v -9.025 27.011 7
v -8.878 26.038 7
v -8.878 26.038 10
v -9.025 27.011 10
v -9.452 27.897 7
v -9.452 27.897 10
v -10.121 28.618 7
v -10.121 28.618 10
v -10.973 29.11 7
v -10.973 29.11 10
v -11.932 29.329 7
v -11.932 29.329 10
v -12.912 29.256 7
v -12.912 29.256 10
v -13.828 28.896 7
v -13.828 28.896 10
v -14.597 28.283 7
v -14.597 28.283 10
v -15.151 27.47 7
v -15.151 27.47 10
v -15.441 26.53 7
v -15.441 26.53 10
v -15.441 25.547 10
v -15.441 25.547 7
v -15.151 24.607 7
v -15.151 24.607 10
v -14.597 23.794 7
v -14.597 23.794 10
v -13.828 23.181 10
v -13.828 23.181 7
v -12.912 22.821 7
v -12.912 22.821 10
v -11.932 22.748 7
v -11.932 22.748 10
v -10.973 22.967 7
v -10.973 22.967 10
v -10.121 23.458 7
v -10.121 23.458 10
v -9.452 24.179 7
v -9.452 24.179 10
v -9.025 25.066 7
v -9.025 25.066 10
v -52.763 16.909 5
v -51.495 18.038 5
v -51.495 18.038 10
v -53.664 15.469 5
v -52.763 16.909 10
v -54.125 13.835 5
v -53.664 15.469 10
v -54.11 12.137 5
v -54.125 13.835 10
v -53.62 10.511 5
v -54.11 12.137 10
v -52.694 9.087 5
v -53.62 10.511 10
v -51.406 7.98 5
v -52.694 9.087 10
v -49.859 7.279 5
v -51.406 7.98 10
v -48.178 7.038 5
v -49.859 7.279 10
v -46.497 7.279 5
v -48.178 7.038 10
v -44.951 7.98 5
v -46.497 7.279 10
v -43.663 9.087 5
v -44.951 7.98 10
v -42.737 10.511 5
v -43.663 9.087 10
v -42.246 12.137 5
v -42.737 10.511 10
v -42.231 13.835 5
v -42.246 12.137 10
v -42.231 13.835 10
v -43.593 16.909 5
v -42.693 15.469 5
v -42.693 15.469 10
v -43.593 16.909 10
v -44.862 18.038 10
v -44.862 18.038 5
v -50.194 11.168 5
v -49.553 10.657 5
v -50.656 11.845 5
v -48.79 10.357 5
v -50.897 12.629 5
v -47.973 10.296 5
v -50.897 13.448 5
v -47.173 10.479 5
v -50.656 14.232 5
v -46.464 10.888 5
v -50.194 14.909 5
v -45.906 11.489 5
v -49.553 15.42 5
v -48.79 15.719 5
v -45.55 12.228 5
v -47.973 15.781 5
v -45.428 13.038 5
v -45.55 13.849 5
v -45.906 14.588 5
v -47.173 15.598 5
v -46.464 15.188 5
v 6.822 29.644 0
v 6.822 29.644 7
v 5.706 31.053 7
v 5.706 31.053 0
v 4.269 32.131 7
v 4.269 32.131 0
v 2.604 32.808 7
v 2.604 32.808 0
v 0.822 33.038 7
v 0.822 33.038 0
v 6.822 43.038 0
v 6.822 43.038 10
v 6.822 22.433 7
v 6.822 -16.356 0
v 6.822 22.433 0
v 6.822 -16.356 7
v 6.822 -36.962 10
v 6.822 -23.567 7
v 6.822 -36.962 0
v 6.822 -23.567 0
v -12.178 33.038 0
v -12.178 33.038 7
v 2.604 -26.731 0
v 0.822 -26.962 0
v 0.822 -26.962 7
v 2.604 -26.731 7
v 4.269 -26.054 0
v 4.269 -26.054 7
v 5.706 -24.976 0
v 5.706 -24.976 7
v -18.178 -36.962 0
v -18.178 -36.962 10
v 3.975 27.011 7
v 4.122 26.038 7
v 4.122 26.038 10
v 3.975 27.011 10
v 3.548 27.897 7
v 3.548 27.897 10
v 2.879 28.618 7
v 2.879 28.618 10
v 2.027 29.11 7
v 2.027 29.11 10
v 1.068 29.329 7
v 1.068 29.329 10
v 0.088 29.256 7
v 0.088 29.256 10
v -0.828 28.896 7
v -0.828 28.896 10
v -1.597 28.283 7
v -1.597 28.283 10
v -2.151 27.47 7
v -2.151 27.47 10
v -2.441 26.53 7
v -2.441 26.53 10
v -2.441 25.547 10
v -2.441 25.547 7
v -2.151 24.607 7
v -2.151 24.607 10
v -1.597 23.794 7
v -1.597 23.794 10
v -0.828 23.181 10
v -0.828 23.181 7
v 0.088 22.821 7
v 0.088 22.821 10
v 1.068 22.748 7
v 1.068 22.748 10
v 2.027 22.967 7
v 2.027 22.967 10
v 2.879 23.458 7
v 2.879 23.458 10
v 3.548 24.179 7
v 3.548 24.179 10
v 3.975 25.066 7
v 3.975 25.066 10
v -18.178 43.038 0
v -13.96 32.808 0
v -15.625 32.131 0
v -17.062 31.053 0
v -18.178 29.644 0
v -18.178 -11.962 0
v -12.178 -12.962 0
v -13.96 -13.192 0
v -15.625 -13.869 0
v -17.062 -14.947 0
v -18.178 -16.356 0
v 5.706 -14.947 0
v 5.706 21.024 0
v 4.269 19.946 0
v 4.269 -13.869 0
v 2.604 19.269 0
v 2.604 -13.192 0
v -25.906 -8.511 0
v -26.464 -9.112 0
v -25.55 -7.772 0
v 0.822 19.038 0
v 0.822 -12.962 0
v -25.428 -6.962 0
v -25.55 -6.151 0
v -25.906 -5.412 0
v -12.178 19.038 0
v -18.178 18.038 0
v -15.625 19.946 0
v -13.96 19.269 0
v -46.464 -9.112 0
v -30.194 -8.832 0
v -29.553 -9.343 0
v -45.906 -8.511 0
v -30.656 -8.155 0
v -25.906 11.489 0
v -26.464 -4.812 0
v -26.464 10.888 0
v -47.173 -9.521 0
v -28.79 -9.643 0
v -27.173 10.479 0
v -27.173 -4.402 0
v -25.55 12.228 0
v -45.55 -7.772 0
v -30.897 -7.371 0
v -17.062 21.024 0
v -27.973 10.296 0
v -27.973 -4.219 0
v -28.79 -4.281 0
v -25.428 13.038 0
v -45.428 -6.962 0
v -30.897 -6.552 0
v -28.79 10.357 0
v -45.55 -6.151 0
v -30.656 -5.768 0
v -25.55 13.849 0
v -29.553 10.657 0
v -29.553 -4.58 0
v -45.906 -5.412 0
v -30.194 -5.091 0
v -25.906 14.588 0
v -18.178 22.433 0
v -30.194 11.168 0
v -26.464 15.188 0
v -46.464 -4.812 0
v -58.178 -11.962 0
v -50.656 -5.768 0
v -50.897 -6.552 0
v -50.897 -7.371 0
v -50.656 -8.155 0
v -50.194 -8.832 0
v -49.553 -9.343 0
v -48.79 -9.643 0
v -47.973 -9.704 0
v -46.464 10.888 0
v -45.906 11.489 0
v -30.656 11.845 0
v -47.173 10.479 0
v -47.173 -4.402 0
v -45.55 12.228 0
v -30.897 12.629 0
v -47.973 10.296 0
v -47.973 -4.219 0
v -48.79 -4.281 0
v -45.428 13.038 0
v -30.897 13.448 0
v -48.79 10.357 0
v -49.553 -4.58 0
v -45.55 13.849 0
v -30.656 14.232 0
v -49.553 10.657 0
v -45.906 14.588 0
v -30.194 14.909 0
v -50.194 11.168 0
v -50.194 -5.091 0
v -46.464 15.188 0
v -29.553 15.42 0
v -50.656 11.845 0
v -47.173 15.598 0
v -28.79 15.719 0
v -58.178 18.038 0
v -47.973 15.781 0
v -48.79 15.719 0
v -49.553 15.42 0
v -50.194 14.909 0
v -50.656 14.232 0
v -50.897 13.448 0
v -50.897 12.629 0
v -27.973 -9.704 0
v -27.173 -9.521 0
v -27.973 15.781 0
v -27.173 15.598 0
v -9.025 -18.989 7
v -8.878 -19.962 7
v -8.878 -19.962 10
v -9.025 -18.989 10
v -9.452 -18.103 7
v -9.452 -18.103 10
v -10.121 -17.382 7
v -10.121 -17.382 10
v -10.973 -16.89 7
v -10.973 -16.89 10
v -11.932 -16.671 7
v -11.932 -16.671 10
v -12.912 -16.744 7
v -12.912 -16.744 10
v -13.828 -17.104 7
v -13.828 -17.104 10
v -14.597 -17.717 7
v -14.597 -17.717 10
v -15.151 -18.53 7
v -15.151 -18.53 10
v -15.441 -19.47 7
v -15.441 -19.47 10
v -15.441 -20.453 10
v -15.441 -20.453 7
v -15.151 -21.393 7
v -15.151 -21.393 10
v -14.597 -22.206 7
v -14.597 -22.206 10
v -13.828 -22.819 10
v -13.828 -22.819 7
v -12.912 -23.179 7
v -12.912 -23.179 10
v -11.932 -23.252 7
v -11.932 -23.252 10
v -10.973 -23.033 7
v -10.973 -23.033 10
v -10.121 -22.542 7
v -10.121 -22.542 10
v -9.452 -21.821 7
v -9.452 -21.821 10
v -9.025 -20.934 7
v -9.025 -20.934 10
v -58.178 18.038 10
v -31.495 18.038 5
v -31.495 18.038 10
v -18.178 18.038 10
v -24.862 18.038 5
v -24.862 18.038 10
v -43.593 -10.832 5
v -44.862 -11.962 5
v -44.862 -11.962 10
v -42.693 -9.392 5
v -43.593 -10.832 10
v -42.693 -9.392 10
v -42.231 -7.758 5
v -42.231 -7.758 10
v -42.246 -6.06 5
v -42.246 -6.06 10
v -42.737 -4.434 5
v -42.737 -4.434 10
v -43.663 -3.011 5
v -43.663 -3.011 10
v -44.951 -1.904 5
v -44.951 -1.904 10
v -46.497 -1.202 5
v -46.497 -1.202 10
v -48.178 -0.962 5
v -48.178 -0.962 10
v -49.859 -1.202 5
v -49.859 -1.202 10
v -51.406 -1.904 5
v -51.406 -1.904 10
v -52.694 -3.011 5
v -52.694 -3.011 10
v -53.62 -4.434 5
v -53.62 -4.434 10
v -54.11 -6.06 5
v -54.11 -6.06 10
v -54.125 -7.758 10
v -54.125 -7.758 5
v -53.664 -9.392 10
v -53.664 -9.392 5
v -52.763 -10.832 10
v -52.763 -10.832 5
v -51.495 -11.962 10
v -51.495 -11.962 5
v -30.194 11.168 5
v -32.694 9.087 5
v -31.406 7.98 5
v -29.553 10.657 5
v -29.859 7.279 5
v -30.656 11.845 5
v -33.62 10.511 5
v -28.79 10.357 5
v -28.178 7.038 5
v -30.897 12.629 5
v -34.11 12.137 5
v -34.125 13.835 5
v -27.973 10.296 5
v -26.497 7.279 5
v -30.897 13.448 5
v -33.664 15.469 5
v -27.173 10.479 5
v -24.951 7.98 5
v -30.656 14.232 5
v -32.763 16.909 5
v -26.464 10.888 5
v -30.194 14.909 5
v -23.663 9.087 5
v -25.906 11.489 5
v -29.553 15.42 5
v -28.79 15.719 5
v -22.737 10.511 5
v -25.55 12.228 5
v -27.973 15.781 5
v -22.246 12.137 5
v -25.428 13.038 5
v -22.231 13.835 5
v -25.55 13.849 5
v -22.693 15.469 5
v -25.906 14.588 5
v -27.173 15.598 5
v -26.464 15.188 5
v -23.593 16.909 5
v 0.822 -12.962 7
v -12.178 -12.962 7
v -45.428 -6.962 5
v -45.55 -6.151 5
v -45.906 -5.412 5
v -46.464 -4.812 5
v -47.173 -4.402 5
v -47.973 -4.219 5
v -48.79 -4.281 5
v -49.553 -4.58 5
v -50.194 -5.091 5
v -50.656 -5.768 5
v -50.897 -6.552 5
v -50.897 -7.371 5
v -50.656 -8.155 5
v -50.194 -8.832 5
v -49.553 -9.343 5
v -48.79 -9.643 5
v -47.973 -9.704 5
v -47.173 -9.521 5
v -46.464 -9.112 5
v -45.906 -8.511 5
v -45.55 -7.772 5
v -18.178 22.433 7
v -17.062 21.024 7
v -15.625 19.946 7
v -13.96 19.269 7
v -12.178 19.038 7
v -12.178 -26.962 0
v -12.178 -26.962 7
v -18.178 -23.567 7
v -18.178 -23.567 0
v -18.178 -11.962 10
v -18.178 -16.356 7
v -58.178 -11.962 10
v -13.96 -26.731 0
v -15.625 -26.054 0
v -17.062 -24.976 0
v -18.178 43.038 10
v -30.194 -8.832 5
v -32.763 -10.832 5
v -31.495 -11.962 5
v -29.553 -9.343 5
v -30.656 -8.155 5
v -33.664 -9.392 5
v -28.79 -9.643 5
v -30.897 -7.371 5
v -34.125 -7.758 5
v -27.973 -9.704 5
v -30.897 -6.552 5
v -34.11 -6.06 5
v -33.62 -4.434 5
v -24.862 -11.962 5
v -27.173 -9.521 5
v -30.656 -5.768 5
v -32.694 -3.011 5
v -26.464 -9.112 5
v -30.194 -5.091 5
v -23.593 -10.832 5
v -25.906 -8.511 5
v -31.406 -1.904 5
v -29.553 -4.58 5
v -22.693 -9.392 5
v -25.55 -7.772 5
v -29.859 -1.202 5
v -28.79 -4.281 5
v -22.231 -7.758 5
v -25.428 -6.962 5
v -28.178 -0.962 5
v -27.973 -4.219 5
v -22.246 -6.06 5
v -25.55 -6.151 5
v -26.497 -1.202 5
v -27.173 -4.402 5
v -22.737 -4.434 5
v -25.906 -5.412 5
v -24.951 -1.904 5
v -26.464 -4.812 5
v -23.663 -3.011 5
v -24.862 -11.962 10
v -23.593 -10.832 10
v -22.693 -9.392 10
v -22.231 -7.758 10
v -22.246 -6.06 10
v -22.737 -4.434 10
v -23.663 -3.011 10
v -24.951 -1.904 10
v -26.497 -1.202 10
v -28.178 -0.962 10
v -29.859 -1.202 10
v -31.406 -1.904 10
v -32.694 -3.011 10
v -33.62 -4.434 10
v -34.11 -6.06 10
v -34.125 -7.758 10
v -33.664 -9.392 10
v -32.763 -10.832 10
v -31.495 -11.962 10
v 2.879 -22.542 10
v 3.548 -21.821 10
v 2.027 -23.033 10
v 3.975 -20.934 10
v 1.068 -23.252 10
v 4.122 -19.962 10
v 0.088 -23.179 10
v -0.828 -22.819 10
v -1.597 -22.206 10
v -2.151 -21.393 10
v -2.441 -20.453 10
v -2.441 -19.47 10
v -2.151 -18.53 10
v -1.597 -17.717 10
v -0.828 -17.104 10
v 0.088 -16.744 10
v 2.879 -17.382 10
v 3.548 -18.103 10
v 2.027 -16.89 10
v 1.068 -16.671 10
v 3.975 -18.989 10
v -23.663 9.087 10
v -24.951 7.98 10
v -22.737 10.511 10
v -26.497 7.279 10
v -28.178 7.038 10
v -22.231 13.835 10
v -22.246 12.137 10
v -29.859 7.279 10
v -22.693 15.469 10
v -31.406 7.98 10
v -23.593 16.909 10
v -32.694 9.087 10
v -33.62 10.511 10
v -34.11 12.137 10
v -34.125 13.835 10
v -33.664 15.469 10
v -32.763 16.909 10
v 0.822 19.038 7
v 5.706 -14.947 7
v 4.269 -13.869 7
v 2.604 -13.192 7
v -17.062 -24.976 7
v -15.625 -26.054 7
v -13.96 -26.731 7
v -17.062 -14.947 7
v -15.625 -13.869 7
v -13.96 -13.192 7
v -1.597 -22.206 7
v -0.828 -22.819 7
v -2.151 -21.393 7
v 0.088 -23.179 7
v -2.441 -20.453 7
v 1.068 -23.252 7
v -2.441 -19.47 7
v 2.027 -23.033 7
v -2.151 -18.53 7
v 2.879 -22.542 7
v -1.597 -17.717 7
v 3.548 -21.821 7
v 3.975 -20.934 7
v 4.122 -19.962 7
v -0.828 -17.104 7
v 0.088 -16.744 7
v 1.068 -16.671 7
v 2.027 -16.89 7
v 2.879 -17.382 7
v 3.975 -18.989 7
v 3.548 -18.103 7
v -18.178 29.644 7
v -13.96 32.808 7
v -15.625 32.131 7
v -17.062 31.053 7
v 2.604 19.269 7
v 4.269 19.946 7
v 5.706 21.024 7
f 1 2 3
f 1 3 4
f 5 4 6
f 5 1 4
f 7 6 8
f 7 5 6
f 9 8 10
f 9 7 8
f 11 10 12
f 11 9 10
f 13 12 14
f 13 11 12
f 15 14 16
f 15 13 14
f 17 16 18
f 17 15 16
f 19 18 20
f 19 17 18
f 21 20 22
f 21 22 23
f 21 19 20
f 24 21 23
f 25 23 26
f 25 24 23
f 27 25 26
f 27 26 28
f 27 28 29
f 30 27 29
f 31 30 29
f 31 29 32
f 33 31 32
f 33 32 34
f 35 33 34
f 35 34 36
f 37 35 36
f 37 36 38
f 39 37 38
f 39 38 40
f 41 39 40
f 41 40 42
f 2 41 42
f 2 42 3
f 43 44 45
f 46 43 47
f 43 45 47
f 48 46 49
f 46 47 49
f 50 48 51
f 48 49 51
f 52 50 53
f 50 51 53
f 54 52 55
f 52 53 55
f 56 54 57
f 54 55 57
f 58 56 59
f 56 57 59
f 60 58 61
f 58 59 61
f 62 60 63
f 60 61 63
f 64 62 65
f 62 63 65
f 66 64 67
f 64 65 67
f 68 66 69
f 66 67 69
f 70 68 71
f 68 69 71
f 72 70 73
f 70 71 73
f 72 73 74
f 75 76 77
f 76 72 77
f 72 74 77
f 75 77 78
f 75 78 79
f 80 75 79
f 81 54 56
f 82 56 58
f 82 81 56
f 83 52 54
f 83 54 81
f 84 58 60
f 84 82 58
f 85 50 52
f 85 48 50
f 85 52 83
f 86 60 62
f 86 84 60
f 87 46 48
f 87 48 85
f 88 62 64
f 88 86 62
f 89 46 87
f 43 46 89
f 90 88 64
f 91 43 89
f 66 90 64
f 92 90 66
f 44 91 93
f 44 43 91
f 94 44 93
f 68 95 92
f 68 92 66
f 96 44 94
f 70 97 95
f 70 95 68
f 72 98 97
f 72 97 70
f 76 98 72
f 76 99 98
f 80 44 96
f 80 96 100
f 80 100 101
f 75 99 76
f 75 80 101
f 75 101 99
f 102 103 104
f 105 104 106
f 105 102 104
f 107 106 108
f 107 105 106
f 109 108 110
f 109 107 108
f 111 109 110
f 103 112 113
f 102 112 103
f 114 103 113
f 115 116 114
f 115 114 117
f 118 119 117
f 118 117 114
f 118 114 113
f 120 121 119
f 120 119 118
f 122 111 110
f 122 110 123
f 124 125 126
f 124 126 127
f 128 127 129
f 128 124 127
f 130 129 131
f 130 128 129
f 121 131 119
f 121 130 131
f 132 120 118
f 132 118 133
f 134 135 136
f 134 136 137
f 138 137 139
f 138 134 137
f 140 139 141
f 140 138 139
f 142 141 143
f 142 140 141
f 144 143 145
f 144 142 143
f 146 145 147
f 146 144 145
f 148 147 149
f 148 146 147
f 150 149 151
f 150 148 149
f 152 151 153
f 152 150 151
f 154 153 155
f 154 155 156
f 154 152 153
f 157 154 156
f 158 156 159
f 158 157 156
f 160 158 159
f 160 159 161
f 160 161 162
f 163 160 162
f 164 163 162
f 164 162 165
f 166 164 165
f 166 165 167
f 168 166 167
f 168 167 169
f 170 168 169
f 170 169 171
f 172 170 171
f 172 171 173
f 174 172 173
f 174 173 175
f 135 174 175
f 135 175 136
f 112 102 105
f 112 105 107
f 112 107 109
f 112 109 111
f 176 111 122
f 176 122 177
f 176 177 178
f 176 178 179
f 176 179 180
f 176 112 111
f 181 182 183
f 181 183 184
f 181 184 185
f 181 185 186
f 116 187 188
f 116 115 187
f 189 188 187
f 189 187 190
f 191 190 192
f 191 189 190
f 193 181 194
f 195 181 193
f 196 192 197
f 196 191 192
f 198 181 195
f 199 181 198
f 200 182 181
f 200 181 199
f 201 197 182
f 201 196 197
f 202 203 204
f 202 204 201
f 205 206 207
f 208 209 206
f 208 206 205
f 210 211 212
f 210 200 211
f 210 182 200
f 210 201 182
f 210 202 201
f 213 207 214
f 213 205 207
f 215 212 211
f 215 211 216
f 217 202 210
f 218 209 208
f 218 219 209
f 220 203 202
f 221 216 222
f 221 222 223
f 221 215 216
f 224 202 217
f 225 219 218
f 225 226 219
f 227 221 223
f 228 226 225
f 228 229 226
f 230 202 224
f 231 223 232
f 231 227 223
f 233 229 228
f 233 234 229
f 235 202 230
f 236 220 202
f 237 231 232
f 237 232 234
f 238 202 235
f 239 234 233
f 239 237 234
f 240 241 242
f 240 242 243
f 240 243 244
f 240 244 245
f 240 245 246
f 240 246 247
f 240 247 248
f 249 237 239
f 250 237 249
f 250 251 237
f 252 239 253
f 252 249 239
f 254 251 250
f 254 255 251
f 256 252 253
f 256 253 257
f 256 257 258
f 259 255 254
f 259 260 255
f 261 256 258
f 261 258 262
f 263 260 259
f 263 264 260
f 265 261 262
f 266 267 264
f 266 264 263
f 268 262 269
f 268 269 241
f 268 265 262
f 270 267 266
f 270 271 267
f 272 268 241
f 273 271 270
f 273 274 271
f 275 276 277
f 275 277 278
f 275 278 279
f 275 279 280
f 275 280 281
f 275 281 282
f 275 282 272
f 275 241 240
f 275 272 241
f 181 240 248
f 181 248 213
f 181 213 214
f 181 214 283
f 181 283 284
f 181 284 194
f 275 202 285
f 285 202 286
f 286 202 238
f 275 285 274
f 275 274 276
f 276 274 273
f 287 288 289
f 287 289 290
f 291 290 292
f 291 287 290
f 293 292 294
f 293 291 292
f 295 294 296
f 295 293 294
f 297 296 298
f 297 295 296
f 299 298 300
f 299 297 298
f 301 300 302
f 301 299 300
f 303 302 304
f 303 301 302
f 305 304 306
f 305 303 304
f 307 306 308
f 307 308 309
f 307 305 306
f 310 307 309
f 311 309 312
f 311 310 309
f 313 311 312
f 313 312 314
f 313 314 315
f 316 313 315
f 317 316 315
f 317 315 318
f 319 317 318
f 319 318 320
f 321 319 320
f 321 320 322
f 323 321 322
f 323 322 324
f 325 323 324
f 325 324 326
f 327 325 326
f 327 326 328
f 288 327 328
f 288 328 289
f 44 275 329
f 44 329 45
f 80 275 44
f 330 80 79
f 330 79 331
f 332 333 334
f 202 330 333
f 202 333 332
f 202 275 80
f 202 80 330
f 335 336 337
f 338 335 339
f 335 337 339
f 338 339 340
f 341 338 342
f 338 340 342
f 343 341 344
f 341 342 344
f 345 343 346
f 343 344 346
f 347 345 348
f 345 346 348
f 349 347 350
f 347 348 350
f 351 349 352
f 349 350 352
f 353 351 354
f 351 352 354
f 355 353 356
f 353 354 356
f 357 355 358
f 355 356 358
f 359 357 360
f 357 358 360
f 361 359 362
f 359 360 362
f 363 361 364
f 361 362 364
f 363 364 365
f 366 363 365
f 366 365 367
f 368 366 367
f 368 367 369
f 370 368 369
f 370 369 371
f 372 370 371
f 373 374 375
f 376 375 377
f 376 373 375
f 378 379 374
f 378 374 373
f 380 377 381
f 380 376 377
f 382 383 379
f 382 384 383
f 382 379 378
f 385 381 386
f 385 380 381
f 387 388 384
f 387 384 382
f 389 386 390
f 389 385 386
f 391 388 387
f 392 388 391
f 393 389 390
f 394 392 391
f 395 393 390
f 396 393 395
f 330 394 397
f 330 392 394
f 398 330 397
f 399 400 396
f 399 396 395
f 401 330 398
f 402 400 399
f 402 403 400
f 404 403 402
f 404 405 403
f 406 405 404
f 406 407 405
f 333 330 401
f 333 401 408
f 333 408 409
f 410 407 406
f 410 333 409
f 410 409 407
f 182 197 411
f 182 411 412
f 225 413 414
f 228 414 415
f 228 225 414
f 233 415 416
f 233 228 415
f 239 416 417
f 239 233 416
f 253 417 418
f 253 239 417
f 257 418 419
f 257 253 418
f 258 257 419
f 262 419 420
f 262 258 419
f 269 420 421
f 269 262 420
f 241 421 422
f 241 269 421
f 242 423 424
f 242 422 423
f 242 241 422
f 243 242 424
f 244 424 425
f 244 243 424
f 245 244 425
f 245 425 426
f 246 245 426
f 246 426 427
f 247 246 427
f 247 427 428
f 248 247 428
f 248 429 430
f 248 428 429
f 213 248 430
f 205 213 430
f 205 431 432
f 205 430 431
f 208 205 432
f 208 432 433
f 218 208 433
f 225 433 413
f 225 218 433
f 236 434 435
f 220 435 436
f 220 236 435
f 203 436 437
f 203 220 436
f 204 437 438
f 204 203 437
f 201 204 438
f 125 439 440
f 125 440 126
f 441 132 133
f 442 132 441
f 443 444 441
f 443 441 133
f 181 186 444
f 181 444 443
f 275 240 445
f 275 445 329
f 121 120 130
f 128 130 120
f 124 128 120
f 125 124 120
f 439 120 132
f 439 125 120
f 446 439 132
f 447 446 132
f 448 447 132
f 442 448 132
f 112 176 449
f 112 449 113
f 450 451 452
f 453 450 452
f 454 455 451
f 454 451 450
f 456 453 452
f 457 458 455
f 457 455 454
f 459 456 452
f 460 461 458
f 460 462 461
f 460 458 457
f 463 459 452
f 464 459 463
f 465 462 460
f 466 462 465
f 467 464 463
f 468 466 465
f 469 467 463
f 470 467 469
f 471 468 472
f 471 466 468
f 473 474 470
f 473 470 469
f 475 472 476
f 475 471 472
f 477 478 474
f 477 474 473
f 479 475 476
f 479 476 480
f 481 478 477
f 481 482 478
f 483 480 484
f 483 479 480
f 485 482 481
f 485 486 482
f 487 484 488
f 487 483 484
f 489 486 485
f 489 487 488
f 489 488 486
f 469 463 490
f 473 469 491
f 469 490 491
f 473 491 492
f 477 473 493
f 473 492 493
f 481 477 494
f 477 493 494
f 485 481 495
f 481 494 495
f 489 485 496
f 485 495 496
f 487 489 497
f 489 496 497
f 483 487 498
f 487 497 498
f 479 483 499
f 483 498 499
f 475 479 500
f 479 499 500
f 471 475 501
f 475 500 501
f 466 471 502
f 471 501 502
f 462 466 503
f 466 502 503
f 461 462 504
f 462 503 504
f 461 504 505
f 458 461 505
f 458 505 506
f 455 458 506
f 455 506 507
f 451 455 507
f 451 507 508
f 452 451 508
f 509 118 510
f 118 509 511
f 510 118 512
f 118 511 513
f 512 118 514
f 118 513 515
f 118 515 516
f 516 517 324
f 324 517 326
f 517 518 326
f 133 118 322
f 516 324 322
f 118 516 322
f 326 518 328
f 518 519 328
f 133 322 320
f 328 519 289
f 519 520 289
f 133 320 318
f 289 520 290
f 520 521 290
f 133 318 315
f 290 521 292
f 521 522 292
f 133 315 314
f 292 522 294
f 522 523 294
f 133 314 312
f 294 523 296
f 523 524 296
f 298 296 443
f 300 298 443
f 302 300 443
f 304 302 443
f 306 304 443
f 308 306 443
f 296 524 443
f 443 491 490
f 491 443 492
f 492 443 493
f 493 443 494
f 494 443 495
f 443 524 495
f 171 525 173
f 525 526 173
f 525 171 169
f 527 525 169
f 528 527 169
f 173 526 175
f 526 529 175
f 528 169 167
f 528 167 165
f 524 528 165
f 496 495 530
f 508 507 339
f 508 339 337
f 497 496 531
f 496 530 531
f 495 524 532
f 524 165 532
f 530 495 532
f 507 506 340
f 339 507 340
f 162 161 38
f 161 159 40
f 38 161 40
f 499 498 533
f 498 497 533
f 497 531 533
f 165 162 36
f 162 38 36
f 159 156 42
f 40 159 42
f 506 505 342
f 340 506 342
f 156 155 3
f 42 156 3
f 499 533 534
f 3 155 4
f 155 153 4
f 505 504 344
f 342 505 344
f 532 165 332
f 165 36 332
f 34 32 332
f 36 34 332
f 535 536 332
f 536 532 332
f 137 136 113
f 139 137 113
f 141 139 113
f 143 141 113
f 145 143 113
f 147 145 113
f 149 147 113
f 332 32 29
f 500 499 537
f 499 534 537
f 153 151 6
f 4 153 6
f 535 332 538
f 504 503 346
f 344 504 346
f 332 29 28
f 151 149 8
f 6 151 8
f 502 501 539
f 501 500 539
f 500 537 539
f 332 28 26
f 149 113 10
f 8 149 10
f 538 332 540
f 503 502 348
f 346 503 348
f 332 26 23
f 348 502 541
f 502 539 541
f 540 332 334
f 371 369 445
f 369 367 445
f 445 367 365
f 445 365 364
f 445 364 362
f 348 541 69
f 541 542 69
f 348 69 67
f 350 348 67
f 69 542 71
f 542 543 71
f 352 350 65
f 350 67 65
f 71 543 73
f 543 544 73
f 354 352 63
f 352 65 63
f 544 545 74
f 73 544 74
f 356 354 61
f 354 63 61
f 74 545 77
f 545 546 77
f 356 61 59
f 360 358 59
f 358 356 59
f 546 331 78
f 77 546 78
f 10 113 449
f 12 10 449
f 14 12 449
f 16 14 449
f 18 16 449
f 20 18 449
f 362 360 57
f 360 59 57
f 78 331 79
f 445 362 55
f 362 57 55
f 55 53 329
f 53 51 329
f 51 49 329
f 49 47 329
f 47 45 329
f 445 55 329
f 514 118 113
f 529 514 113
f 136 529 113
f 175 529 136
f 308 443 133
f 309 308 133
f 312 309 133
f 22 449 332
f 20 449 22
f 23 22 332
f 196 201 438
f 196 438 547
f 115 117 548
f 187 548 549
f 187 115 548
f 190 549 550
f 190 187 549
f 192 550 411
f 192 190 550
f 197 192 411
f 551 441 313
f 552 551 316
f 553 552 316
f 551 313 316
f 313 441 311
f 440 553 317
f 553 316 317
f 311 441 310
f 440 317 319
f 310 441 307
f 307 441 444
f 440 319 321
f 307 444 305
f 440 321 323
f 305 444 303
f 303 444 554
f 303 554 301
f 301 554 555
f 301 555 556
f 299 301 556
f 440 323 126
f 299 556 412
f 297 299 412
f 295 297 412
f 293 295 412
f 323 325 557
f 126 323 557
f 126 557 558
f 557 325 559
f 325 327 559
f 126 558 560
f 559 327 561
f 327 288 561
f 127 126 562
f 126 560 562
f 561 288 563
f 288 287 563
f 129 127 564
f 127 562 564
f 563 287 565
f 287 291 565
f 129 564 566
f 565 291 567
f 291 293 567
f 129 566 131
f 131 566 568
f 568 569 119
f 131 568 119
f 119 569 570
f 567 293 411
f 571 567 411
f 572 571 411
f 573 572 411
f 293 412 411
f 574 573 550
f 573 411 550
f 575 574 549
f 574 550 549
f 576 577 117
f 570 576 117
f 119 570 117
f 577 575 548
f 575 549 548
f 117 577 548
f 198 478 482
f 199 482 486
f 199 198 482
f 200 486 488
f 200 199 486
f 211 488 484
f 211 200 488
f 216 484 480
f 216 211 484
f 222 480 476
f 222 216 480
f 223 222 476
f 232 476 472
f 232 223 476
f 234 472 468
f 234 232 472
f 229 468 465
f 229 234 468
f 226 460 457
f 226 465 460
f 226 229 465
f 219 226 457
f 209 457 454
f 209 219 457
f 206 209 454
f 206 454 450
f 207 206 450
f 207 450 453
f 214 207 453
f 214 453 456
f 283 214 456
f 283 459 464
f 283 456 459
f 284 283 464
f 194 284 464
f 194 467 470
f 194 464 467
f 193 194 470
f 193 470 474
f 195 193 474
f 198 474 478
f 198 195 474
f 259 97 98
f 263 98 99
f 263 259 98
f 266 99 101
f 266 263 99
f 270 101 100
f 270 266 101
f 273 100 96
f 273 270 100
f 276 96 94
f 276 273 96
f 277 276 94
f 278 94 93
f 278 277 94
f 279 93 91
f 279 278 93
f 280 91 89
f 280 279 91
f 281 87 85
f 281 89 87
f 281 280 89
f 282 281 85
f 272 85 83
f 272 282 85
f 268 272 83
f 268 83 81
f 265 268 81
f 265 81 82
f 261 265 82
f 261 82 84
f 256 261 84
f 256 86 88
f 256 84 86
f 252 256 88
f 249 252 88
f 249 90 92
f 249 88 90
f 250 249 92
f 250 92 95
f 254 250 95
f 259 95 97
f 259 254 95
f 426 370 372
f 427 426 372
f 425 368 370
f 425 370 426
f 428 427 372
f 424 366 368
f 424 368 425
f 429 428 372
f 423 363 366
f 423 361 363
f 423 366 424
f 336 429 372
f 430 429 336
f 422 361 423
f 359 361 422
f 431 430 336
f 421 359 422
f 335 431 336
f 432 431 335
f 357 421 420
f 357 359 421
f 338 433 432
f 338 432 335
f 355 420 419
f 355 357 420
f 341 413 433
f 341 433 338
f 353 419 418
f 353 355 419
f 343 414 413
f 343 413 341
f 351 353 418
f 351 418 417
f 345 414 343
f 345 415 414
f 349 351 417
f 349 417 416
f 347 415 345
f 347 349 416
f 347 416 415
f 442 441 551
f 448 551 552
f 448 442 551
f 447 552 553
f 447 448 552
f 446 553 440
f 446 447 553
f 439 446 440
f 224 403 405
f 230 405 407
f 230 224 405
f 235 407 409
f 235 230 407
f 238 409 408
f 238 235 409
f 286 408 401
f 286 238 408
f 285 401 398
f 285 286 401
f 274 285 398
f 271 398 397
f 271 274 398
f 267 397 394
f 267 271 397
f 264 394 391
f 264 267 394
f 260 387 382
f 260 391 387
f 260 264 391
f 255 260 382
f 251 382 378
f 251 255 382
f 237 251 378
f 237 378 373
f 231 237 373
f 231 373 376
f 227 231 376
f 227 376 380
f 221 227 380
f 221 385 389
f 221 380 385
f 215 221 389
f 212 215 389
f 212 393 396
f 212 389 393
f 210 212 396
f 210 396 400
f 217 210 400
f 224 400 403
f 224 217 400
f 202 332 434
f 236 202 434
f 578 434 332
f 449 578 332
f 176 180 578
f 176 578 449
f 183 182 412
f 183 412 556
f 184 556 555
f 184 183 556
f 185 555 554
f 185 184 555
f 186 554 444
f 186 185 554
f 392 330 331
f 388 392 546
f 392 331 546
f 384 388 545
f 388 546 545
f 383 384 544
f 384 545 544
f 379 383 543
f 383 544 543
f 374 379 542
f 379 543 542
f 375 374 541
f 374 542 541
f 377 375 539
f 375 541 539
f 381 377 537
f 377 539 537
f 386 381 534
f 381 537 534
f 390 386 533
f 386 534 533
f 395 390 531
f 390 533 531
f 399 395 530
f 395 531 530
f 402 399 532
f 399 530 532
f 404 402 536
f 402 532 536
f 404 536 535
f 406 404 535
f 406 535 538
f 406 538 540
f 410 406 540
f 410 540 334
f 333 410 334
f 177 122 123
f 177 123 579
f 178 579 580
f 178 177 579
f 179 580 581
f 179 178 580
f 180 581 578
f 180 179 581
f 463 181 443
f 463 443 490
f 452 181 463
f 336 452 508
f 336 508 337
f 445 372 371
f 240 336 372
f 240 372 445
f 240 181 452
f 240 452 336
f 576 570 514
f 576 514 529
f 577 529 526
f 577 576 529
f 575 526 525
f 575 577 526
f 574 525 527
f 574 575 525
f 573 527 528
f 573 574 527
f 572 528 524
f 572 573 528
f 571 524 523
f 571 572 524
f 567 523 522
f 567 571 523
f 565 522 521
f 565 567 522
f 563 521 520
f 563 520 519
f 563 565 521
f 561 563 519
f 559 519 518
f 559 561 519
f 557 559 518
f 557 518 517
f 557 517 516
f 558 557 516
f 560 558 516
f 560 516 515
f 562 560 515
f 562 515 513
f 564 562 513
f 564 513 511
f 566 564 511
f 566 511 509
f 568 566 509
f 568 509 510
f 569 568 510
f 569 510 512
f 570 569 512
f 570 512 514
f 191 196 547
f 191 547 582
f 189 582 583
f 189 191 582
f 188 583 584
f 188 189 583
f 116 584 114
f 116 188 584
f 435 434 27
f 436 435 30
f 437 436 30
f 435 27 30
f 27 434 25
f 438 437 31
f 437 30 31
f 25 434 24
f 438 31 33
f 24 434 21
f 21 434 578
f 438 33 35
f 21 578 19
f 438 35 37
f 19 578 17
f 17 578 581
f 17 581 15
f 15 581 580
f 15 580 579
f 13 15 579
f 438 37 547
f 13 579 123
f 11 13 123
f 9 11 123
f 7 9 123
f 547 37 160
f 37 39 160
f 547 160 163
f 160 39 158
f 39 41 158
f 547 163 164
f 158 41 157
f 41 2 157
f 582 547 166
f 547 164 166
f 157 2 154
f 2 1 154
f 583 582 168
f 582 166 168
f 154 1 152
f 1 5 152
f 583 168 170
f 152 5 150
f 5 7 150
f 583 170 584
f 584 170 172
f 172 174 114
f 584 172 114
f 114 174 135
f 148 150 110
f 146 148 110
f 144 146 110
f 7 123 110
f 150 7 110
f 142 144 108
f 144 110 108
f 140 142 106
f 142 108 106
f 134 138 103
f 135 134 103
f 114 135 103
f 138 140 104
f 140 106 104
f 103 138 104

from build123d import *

# Parameters (mm, degrees)
ESQUISSE1_R             = 3.3
ESQUISSE1_R_2           = 2.75
BOSS_EXTRU_1_DEPTH      = 10
ESQUISSE2_R             = 6
ENL_V_MAT_EXTRU_1_DEPTH = 5
ENL_V_MAT_EXTRU_3_DEPTH = 7


with BuildPart() as part:
    # Esquisse1 → Boss.-Extru.1 (new body)
    with BuildSketch(Plane.XY):
        Polygon((6.821863894, 43.038413396), (6.821863894, -36.961586604), (-18.178136106, -36.961586604), (-18.178136106, -11.961586604), (-58.178136106, -11.961586604), (-58.178136106, 18.038413396), (-18.178136106, 18.038413396), (-18.178136106, 43.038413396), align=None)
        with Locations((0.821863894, 26.038413396)):
            Circle(ESQUISSE1_R, mode=Mode.SUBTRACT)
        with Locations((-12.178136106, 26.038413396)):
            Circle(ESQUISSE1_R, mode=Mode.SUBTRACT)
        with Locations((-12.178136106, -19.961586604)):
            Circle(ESQUISSE1_R, mode=Mode.SUBTRACT)
        with Locations((0.821863894, -19.961586604)):
            Circle(ESQUISSE1_R, mode=Mode.SUBTRACT)
        with Locations((-48.178136106, 13.038413396)):
            Circle(ESQUISSE1_R_2, mode=Mode.SUBTRACT)
        with Locations((-28.178136106, 13.038413396)):
            Circle(ESQUISSE1_R_2, mode=Mode.SUBTRACT)
        with Locations((-28.178136106, -6.961586604)):
            Circle(ESQUISSE1_R_2, mode=Mode.SUBTRACT)
        with Locations((-48.178136106, -6.961586604)):
            Circle(ESQUISSE1_R_2, mode=Mode.SUBTRACT)
    extrude(amount=BOSS_EXTRU_1_DEPTH)

    # Esquisse2 → Enlèv. mat.-Extru.1 (cut)
    with BuildSketch(Plane.XY.offset(10)):
        with Locations((-48.178136106, 13.038413396)):
            Circle(ESQUISSE2_R)
        with Locations((-28.178136106, 13.038413396)):
            Circle(ESQUISSE2_R)
        with Locations((-28.178136106, -6.961586604)):
            Circle(ESQUISSE2_R)
        with Locations((-48.178136106, -6.961586604)):
            Circle(ESQUISSE2_R)
    extrude(amount=-ENL_V_MAT_EXTRU_1_DEPTH, mode=Mode.SUBTRACT)

    # Esquisse3 → Enlèv. mat.-Extru.3 (cut)
    with BuildSketch(Plane(origin=(0, 0, 0), x_dir=(-1, 0, 0), z_dir=(0, 0, -1))):
        with BuildLine():
            Line((-0.821863894, 33.038413396), (12.178136106, 33.038413396))
            ThreePointArc((12.178136106, 33.038413396), (19.178136106, 26.038413396), (12.178136106, 19.038413396))
            Line((12.178136106, 19.038413396), (-0.821863894, 19.038413396))
            ThreePointArc((-0.821863894, 19.038413396), (-7.821863894, 26.038413396), (-0.821863894, 33.038413396))
        make_face()
        with BuildLine():
            Line((-0.821863894, -12.961586604), (12.178136106, -12.961586604))
            ThreePointArc((12.178136106, -12.961586604), (19.178136106, -19.961586604), (12.178136106, -26.961586604))
            Line((12.178136106, -26.961586604), (-0.821863894, -26.961586604))
            ThreePointArc((-0.821863894, -26.961586604), (-7.821863894, -19.961586604), (-0.821863894, -12.961586604))
        make_face()
    extrude(amount=-ENL_V_MAT_EXTRU_3_DEPTH, mode=Mode.SUBTRACT)


solid = part.part
